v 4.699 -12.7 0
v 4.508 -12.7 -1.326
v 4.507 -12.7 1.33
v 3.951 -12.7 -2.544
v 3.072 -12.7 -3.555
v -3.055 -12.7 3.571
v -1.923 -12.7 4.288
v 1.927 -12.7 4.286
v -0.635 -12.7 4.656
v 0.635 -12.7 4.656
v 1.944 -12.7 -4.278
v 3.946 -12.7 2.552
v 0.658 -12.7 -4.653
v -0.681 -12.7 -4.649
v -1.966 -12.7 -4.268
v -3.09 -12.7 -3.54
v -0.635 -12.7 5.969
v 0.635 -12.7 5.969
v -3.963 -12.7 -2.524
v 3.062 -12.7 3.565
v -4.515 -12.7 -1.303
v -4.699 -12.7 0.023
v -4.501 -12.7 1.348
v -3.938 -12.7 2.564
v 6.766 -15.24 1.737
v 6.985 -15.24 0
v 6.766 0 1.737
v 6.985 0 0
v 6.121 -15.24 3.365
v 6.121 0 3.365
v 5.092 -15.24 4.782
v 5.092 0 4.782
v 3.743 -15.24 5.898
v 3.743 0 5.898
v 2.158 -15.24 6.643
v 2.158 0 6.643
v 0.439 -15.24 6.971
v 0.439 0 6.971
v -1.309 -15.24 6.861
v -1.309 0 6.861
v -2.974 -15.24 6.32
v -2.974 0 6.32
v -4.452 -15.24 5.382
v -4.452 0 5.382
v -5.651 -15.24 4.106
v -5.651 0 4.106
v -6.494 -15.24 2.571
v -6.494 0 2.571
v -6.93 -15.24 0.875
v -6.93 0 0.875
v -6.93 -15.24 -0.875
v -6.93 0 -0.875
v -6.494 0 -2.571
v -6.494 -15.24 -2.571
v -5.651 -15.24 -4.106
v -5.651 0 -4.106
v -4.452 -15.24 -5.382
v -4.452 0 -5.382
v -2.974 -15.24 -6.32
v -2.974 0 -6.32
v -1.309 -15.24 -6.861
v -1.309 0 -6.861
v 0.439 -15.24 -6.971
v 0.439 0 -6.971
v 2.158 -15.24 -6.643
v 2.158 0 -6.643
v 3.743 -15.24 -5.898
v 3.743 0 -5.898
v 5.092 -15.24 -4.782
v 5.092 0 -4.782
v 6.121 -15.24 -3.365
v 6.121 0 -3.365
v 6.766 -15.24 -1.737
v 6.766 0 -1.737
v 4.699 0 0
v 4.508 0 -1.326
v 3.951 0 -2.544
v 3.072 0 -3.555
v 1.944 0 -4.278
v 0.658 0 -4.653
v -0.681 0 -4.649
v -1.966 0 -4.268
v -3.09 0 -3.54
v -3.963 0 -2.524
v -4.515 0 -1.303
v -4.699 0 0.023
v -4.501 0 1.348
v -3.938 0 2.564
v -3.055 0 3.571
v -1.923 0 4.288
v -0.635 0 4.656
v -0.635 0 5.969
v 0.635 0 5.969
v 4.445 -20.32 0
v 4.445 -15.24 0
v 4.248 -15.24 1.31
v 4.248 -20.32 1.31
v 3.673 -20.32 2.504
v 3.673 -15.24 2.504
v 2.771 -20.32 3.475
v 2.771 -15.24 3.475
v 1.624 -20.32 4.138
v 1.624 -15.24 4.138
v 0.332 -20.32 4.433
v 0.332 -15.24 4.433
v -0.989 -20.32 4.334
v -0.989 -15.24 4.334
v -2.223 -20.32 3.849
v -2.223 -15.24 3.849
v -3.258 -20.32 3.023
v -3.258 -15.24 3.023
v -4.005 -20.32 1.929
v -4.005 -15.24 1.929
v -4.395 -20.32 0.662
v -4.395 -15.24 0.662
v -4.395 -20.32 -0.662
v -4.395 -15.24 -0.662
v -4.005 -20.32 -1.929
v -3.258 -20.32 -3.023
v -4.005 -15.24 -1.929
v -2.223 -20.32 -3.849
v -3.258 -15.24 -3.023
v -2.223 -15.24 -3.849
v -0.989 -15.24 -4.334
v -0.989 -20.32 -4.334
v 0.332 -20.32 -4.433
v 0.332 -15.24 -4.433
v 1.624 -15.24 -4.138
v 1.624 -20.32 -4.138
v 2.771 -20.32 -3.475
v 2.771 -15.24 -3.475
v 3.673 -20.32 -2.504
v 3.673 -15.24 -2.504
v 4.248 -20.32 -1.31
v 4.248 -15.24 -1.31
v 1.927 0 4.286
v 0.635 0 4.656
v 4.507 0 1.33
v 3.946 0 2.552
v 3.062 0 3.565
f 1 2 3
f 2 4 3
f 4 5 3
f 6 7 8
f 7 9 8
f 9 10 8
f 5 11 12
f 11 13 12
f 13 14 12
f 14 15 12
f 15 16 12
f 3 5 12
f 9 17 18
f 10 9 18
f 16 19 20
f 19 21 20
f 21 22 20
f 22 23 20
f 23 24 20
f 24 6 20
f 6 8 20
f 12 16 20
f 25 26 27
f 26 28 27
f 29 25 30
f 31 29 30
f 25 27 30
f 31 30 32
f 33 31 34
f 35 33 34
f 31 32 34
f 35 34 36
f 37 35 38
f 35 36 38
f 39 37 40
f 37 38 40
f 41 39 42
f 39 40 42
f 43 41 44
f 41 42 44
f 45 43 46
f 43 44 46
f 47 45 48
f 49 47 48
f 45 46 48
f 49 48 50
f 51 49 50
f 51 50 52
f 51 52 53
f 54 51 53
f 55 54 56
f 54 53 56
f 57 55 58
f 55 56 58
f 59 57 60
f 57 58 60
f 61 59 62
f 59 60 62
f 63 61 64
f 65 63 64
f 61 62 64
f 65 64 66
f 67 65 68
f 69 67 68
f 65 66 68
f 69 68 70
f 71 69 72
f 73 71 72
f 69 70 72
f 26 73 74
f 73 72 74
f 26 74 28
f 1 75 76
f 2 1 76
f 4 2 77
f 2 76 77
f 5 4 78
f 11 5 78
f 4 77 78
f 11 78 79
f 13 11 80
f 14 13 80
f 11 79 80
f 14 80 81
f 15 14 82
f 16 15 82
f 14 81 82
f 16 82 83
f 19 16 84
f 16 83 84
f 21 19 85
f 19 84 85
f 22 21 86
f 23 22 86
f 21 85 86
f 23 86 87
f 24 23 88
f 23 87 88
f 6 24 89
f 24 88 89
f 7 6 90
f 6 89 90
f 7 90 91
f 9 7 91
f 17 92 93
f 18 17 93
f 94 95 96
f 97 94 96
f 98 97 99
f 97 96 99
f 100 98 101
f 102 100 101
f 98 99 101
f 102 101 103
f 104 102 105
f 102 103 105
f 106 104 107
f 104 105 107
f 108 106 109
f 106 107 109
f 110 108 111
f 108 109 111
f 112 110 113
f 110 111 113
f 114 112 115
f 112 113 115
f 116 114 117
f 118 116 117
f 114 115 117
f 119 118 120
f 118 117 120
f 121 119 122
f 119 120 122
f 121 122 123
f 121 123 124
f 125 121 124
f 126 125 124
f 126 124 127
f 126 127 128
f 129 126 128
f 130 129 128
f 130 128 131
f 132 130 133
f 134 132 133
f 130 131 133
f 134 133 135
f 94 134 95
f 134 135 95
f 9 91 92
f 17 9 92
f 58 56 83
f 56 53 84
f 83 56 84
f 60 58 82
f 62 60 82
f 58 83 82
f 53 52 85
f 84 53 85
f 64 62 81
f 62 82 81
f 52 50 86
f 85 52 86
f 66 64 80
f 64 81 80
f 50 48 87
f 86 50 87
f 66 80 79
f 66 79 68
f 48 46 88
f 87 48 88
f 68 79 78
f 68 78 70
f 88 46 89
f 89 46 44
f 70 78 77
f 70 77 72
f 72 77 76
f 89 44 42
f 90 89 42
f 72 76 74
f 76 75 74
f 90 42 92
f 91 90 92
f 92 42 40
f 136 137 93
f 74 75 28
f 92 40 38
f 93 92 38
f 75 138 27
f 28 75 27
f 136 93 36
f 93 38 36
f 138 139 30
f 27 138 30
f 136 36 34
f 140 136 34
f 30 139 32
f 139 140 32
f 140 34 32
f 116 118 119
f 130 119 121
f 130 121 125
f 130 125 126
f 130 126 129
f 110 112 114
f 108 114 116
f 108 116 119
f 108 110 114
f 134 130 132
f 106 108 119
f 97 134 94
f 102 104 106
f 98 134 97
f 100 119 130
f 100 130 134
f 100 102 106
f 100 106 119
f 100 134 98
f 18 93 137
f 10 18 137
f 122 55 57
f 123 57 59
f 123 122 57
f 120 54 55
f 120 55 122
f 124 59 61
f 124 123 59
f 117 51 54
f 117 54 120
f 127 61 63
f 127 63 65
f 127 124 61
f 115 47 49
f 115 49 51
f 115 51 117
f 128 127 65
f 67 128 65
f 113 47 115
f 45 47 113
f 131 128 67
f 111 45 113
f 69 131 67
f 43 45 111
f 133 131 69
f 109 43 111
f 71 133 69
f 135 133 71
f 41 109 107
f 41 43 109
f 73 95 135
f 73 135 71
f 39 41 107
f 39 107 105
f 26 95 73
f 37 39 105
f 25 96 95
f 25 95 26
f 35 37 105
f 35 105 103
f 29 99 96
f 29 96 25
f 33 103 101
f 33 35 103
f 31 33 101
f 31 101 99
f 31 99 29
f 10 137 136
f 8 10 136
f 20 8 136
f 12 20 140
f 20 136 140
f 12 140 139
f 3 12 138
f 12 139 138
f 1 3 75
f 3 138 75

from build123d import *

# Parameters (mm, degrees)
F0_R     = 6.985
F1_DEPTH = 12.7
F2_R     = 6.985
F3_DEPTH = 2.54
F4_R     = 4.445
F5_DEPTH = 5.08


with BuildPart() as f1:
    # F0 (on Front) → F1 (new body)
    with BuildSketch(Plane.XZ):
        Circle(F0_R)
        with BuildLine():
            ThreePointArc((0.635, 4.655897), (3.540089, 3.090043), (4.699, 0))
            ThreePointArc((4.699, 0), (-3.090043, -3.540089), (-0.635, 4.655897))
            Line((-0.635, 4.655897), (-0.635, 5.969))
            Line((-0.635, 5.969), (0, 5.969))
            Line((0, 5.969), (0.635, 5.969))
            Line((0.635, 5.969), (0.635, 4.655897))
        make_face(mode=Mode.SUBTRACT)
    extrude(amount=F1_DEPTH)

    # F2 (on face) → F3 (join)
    with BuildSketch(Plane.XZ.offset(12.7)):
        Circle(F2_R)
    extrude(amount=F3_DEPTH)

    # F4 (on face) → F5 (join)
    with BuildSketch(Plane.XZ.offset(15.24)):
        Circle(F4_R)
    extrude(amount=F5_DEPTH)


solid = f1.part
